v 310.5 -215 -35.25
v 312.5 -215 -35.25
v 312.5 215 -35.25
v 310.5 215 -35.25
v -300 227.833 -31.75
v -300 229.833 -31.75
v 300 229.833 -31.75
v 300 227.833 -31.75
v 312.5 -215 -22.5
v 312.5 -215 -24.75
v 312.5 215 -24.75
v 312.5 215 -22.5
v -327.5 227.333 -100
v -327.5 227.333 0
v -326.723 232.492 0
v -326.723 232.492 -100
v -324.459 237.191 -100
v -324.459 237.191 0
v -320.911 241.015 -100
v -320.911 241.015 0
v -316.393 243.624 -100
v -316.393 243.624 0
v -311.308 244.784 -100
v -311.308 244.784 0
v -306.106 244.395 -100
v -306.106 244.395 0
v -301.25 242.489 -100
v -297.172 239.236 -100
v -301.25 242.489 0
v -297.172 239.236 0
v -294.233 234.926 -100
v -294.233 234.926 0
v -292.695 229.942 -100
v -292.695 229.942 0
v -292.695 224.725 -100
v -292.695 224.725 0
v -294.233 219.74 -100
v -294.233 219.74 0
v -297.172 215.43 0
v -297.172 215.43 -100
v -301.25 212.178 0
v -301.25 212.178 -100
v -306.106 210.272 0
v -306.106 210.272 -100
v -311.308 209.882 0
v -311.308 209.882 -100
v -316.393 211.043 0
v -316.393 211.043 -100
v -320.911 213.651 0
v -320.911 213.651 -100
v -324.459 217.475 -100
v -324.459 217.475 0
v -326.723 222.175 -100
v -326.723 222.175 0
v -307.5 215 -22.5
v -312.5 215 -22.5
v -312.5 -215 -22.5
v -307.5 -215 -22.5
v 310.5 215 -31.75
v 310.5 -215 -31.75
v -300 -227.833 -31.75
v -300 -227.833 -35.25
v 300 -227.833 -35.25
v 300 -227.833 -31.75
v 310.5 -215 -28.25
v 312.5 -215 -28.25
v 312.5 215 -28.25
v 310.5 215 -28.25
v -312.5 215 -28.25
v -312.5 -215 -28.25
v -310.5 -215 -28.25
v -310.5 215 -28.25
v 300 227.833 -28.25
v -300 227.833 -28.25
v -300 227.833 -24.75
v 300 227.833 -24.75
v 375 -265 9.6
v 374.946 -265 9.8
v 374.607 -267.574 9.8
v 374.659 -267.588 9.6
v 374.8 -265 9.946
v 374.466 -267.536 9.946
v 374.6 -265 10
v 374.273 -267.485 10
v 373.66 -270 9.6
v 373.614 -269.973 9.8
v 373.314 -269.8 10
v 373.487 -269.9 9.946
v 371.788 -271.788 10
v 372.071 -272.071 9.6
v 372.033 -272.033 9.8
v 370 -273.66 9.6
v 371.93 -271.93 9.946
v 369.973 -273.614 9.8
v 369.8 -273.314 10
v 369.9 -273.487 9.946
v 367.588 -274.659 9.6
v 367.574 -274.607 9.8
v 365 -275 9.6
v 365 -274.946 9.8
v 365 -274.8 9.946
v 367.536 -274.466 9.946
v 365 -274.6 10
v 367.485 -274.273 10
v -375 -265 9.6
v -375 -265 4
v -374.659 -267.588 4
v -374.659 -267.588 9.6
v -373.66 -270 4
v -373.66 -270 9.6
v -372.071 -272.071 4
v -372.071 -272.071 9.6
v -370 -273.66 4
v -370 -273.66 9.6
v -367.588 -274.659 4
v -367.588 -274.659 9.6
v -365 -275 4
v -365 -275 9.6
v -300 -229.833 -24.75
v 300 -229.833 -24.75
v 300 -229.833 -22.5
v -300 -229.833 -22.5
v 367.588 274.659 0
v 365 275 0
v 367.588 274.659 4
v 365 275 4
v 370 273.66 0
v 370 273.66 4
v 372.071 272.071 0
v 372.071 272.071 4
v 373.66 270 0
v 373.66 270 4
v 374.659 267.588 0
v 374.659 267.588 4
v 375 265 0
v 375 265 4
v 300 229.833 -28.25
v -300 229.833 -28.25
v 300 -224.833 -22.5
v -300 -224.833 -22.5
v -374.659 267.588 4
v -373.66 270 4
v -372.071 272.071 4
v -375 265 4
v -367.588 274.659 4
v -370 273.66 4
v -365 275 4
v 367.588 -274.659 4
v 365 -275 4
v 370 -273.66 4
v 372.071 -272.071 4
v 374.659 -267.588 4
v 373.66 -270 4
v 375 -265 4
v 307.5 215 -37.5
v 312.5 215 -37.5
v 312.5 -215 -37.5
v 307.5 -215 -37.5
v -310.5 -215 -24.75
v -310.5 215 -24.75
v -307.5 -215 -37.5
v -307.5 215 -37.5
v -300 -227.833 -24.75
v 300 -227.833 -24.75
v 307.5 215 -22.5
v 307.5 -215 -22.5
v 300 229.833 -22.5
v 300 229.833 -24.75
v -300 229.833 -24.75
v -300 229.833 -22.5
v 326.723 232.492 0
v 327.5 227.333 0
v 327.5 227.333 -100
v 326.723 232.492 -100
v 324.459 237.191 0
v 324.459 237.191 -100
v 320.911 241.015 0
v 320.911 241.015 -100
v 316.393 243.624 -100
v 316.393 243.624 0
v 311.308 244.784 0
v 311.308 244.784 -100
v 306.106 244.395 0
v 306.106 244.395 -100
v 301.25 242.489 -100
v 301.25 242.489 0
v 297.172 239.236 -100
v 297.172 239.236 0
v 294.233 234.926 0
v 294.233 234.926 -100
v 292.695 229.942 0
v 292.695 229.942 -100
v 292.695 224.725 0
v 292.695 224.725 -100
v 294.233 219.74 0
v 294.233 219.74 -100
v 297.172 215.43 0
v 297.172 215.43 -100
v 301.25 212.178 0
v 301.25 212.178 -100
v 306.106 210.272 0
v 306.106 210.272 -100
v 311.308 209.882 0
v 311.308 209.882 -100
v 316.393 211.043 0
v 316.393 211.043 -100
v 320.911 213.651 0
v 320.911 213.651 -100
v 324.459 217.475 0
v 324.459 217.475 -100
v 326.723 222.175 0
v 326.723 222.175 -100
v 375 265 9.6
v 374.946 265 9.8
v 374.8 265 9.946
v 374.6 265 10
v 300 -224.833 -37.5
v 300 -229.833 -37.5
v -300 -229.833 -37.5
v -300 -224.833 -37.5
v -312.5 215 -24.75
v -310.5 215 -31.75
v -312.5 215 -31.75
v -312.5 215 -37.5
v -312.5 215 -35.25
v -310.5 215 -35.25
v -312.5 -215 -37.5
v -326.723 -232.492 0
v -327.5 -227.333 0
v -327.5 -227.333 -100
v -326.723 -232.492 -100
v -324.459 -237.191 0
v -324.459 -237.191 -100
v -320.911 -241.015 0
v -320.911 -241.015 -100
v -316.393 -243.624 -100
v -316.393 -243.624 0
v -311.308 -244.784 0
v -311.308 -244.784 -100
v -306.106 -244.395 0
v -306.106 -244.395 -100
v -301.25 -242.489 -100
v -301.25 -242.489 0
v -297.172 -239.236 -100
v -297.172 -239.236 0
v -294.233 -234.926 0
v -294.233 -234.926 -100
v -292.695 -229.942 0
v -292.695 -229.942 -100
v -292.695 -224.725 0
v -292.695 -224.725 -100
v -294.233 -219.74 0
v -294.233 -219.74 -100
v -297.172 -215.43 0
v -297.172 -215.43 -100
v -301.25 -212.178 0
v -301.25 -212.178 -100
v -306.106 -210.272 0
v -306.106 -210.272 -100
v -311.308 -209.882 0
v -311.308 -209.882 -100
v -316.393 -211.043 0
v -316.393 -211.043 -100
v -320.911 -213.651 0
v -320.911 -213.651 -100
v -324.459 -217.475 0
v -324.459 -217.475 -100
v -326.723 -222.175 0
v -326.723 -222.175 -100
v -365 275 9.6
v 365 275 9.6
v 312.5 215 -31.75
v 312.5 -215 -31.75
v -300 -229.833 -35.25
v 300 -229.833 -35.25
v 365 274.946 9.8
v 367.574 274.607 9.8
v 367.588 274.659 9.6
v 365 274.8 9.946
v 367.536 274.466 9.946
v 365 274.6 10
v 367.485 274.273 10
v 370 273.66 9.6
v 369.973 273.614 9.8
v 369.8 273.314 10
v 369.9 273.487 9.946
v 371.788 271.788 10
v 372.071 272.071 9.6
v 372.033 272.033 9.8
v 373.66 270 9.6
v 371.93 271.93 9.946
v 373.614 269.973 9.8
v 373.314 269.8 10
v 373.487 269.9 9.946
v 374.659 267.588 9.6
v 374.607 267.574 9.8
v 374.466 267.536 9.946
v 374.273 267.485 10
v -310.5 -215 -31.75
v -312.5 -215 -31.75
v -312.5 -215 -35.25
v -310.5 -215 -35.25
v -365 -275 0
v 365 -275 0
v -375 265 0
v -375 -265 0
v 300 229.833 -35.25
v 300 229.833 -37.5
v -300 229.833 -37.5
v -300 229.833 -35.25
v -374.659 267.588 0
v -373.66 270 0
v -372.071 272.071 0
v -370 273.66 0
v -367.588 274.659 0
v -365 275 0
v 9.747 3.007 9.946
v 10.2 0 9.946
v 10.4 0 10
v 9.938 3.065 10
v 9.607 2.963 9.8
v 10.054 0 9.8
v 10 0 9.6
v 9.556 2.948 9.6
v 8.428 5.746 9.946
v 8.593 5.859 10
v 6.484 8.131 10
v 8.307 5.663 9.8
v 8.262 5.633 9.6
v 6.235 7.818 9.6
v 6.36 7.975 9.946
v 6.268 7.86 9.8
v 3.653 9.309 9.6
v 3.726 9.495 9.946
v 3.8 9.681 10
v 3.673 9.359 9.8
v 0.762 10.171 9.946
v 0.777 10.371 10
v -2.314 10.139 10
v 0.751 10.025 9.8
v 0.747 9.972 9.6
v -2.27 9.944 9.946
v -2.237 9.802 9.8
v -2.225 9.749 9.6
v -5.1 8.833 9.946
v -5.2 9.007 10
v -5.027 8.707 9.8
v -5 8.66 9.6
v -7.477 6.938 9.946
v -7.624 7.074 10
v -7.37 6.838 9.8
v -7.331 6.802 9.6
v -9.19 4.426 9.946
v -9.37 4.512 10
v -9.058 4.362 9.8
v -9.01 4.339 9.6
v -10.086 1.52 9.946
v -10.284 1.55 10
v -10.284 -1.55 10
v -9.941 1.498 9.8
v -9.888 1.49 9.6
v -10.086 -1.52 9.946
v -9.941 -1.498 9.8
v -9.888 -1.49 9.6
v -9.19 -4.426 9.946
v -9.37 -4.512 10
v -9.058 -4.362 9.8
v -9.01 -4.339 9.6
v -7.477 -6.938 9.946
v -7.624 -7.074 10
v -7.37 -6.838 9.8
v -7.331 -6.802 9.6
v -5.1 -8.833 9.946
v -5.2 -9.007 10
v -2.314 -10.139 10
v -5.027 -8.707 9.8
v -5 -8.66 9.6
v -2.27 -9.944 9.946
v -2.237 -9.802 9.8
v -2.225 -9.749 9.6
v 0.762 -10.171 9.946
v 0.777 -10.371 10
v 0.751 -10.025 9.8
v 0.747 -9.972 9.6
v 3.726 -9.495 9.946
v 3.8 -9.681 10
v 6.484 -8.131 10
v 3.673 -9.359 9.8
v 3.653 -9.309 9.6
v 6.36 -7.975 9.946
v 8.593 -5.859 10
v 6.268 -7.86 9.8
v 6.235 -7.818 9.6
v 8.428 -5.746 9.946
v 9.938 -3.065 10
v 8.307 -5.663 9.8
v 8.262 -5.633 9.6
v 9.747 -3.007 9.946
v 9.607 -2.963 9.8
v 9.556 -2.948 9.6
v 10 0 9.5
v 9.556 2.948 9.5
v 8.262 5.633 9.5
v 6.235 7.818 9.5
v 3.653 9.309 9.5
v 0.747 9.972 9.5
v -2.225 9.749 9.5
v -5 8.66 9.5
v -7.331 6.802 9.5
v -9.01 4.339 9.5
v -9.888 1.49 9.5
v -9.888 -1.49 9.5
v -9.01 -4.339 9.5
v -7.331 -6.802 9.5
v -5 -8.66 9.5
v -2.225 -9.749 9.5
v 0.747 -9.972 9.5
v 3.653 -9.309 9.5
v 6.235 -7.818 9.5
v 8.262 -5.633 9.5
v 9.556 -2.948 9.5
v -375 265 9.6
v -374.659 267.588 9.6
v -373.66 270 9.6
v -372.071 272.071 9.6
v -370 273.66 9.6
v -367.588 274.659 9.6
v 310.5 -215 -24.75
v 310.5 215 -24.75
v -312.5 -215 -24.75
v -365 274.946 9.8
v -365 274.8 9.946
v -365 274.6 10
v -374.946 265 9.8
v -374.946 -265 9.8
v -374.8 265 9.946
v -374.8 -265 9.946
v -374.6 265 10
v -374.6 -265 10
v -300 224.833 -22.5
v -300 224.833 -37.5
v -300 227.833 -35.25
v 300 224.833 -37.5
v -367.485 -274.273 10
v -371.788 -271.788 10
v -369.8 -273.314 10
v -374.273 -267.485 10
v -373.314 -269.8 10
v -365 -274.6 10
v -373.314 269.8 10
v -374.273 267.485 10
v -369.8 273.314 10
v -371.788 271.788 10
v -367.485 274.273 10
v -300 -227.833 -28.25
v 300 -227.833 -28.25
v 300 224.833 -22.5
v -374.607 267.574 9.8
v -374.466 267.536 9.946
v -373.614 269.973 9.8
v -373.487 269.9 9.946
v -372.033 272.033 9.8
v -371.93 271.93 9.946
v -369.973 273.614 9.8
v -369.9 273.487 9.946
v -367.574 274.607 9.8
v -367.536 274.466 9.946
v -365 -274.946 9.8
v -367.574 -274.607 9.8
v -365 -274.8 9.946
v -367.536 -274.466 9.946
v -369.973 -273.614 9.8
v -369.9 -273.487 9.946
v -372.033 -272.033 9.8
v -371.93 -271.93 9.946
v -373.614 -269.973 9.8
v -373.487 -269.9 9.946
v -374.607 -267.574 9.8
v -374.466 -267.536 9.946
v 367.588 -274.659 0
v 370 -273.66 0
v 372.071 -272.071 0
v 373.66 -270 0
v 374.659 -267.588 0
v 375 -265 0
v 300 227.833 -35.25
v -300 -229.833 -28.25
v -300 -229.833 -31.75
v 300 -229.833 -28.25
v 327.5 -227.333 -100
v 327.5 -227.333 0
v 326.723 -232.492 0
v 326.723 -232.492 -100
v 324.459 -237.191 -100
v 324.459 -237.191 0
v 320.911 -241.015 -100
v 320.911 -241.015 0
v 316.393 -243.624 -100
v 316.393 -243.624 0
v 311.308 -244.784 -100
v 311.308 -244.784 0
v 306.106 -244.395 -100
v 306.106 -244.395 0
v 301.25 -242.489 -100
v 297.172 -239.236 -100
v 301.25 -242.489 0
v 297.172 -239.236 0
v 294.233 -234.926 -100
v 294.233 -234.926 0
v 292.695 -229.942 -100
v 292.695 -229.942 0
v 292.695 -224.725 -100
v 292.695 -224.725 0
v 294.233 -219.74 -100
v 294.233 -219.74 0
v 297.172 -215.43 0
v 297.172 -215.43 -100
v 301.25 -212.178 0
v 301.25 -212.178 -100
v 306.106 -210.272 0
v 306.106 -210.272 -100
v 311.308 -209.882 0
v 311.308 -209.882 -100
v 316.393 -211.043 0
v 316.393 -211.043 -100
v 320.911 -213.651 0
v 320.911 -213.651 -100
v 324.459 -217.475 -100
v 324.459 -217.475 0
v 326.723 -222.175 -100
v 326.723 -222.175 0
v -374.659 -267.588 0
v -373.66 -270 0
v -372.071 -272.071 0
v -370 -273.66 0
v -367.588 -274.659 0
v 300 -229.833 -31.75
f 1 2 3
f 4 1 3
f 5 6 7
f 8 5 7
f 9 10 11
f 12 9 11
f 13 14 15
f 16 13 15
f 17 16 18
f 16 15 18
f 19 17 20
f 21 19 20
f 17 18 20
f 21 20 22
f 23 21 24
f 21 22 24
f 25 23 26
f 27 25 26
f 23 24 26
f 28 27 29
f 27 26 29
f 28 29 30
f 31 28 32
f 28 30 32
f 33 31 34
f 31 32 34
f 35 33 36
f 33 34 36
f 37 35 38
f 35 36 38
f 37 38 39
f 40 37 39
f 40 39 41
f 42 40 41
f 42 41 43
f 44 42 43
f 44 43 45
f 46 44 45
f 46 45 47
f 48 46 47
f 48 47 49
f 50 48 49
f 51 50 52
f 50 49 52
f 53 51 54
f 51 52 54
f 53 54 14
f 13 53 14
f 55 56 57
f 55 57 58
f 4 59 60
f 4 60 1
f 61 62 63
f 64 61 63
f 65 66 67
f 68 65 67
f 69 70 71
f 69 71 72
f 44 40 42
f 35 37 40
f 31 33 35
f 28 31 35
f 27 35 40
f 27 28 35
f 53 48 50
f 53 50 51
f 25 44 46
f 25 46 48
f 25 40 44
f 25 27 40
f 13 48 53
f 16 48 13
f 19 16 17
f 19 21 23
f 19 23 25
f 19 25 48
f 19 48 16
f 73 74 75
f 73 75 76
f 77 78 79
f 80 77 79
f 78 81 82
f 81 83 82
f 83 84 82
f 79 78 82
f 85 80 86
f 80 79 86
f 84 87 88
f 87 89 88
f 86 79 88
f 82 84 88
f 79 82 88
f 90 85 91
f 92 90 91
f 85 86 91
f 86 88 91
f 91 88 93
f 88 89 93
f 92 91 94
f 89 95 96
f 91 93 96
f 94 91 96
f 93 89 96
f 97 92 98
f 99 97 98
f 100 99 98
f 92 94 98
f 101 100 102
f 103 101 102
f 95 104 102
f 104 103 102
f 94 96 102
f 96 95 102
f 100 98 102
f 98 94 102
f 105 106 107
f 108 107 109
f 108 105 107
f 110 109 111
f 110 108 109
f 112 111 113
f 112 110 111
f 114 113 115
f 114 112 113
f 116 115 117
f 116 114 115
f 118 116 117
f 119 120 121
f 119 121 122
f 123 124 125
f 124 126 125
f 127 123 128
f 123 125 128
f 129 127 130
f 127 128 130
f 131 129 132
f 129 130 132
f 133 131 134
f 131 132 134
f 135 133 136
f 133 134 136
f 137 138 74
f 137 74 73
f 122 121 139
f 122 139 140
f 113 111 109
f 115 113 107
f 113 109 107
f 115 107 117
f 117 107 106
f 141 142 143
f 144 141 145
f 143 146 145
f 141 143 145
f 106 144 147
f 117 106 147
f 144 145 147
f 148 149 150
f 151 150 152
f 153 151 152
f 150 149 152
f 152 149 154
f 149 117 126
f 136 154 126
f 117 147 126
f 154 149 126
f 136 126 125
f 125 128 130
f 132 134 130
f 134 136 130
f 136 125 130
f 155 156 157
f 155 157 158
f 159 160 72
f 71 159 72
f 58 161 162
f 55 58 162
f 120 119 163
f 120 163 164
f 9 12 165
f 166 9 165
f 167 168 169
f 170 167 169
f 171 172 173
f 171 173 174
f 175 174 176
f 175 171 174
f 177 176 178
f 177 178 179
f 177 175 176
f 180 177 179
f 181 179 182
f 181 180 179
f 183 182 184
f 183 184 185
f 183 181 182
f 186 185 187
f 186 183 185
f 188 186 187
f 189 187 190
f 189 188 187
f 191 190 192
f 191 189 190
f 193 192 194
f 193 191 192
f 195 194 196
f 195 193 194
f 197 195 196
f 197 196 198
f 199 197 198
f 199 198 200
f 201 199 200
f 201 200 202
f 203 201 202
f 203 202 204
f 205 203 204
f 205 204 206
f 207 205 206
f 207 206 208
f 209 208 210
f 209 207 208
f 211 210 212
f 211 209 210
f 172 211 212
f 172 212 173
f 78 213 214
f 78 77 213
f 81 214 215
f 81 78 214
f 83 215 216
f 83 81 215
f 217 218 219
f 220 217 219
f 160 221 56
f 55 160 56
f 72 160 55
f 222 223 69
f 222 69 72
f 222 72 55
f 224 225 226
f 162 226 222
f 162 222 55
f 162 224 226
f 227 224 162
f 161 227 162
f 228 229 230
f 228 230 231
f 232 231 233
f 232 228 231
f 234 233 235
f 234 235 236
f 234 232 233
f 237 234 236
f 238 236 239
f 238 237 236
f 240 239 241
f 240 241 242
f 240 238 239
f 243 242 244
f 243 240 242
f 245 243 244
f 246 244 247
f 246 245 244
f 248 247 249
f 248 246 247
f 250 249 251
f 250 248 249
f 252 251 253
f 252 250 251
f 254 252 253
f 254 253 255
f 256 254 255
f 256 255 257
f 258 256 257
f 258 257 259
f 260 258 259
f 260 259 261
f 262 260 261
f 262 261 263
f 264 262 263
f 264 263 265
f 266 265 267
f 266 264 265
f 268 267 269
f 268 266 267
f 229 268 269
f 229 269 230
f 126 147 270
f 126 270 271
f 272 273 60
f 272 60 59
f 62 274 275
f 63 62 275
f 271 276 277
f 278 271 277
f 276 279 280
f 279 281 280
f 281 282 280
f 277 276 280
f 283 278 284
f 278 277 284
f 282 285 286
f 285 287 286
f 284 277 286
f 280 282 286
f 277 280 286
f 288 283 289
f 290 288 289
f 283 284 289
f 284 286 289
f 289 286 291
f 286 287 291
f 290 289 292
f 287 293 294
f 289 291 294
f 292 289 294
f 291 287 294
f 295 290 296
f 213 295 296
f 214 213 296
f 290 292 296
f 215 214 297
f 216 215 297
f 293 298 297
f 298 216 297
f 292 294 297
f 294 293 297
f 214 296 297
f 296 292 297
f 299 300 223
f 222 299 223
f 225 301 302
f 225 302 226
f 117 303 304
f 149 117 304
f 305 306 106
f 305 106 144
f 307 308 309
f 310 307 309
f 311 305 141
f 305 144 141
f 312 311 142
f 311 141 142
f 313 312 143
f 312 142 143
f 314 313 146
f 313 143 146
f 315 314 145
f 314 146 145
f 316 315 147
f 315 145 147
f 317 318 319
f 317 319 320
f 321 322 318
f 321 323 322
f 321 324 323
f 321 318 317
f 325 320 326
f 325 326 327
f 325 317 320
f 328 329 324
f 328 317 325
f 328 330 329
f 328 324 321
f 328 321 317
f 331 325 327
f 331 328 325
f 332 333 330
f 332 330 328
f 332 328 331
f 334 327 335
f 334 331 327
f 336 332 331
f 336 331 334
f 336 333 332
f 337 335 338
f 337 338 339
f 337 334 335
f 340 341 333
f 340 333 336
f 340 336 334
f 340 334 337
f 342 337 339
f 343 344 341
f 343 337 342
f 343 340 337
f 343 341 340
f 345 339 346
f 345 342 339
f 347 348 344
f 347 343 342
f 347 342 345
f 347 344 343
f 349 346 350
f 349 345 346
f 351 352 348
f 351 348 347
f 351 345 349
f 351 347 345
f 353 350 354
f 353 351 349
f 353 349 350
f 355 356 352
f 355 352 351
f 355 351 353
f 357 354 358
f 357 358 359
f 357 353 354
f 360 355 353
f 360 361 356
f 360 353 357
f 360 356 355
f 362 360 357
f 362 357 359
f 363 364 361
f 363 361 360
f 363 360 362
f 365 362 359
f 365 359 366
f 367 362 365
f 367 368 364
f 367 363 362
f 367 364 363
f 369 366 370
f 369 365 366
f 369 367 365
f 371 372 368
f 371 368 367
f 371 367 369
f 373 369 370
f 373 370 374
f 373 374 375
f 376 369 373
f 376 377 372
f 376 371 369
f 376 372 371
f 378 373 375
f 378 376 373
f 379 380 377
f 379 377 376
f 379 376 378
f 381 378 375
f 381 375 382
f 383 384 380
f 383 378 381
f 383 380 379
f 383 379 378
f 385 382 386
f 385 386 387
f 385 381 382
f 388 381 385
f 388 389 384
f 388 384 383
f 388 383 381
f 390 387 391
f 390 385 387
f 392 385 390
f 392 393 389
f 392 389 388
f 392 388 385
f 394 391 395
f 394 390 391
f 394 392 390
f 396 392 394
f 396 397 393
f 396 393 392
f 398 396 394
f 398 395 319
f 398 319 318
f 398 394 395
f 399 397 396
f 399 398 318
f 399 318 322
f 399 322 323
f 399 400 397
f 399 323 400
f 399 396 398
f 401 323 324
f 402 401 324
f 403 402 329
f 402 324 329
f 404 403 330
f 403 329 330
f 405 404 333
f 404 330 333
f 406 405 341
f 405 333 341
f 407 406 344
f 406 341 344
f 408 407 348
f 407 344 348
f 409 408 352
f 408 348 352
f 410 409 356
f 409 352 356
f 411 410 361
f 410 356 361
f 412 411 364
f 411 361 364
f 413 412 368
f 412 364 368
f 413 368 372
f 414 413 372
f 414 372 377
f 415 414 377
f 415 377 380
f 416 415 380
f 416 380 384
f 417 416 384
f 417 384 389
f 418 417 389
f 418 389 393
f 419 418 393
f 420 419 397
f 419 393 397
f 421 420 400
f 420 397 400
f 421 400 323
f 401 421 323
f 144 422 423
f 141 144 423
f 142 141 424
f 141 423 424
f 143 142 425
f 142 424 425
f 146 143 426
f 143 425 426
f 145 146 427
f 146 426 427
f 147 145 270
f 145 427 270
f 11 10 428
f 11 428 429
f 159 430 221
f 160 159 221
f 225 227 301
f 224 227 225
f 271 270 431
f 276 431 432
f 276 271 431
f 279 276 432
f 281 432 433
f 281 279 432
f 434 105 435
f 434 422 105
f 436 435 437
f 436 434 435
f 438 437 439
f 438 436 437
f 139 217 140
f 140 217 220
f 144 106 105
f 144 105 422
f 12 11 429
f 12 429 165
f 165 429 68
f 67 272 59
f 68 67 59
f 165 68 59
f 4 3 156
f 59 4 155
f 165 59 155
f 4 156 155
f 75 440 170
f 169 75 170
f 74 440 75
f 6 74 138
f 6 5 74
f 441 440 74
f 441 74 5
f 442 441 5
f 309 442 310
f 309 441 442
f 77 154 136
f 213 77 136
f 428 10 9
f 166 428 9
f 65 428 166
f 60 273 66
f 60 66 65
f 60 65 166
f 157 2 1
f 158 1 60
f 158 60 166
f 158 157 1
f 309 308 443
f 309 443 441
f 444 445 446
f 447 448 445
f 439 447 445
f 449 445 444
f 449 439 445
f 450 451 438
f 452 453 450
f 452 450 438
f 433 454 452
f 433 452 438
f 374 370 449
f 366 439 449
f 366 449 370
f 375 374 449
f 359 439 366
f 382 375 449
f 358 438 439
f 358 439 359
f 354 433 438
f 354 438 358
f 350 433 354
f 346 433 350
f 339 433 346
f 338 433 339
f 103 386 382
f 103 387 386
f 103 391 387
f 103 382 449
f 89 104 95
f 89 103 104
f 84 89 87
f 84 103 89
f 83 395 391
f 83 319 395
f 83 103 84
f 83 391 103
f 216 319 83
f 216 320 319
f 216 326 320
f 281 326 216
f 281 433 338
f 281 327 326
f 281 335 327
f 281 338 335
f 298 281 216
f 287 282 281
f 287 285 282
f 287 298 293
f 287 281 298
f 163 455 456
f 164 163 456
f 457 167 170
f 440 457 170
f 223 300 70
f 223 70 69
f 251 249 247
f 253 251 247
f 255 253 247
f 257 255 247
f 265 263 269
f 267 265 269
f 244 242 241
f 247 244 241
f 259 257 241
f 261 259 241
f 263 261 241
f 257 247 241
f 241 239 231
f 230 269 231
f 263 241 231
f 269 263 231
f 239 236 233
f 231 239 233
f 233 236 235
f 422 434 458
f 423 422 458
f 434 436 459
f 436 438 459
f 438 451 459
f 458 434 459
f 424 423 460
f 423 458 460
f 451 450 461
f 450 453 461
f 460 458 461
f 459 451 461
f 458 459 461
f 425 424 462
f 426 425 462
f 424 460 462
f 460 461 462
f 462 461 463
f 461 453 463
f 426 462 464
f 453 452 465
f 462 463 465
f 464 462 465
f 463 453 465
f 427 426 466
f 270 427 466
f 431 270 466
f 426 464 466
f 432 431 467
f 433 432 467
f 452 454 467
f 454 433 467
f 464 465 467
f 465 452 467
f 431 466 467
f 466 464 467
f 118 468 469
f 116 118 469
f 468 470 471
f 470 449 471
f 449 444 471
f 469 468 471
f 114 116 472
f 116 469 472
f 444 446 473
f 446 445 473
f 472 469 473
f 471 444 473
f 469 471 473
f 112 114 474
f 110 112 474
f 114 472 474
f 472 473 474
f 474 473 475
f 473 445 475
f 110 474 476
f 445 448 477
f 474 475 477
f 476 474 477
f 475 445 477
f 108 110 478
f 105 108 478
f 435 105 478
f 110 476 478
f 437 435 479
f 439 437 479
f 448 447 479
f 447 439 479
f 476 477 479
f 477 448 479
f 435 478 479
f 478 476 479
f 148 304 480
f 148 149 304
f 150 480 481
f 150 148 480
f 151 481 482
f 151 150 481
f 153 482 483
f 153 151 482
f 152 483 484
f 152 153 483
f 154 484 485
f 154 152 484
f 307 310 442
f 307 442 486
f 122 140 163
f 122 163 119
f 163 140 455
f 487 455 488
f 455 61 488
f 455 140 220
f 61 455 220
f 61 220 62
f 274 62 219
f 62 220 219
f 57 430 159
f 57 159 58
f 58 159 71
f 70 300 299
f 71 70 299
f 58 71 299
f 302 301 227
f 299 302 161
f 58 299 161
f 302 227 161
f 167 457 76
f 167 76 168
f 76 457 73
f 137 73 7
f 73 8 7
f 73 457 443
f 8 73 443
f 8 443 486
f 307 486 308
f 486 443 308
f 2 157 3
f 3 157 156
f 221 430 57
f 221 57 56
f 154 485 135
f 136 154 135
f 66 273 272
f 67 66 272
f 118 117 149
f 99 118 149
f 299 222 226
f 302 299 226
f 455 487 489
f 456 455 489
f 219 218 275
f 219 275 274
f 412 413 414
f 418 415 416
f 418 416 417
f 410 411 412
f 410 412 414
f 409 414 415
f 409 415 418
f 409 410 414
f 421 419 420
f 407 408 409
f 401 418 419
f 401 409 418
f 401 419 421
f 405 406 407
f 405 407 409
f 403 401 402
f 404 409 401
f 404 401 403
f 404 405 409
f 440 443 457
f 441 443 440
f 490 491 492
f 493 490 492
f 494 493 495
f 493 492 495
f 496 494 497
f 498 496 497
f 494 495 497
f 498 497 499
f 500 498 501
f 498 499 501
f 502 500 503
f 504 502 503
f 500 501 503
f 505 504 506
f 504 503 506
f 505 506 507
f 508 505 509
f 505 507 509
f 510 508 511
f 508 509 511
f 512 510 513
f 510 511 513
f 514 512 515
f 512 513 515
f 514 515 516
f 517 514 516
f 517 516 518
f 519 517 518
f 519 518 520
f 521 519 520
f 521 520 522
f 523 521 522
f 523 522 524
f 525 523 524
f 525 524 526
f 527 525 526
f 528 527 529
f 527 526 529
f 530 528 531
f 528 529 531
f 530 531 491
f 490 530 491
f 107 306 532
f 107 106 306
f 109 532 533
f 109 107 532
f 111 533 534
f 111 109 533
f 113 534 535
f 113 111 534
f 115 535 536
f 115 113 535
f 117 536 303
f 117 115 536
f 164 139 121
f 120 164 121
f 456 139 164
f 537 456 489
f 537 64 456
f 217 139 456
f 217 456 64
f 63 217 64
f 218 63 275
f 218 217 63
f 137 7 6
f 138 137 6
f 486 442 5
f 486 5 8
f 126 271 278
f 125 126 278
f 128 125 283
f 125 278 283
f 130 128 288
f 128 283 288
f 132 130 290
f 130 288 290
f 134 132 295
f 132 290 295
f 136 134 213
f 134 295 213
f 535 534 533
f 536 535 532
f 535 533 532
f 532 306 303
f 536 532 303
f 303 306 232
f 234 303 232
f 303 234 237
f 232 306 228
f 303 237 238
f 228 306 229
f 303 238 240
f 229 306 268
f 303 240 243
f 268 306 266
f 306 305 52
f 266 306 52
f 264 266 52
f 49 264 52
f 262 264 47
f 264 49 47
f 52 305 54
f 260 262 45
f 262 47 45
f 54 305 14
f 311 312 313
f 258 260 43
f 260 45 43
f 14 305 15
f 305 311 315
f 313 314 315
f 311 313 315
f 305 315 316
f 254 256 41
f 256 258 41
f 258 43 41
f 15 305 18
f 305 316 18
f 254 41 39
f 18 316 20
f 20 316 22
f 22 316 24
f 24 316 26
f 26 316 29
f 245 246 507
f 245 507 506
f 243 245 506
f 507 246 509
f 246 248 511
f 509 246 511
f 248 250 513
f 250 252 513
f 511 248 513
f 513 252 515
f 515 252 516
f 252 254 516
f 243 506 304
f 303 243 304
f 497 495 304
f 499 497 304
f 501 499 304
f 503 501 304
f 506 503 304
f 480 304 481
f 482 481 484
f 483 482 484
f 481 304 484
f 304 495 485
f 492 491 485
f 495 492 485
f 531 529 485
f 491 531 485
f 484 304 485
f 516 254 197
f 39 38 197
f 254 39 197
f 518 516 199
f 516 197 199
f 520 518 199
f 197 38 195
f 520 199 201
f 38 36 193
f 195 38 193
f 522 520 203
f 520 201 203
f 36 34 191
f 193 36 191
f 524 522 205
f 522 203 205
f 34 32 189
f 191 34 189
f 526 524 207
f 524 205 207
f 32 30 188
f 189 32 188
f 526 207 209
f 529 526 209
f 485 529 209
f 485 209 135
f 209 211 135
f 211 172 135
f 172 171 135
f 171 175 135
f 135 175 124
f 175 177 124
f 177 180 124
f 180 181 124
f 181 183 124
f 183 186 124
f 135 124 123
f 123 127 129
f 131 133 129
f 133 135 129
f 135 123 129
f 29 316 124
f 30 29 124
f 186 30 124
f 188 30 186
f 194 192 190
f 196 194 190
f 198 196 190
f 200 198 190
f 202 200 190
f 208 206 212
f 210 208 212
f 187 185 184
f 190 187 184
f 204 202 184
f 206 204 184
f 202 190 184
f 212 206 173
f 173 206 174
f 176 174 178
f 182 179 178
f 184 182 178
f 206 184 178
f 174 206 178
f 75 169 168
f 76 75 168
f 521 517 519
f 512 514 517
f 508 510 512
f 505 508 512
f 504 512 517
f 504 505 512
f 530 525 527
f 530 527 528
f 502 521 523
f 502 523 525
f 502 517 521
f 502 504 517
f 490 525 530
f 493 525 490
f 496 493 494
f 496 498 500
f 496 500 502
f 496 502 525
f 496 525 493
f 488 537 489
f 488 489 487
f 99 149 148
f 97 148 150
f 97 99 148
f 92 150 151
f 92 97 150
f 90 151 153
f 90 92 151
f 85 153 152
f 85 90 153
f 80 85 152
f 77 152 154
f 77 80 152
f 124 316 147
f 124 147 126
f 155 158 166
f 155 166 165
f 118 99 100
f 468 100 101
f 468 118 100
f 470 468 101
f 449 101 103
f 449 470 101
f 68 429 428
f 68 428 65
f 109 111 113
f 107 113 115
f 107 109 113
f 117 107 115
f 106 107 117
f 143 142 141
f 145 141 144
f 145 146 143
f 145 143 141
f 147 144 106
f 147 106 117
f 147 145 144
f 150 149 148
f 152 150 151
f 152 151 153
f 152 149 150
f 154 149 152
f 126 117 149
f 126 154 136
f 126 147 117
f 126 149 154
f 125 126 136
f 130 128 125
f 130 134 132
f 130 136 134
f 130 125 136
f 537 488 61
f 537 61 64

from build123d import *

# Parameters (mm, degrees)
SKETCH1_W               = 750
SKETCH1_H               = 550
BOSS_EXTRUDE1_DEPTH     = 4
SKETCH2_R               = 17.5
BOSS_EXTRUDE2_DEPTH     = 100
MIRROR2_COPY_1_SKETCH_R = 17.5
MIRROR2_COPY_1_DEPTH    = 100
SKETCH3_W               = 600
SKETCH3_H               = 5
BOSS_EXTRUDE3_DEPTH     = 7.5
SKETCH3_W_2             = 5
SKETCH3_H_2             = 430
BOSS_EXTRUDE3_2_DEPTH   = 7.5
SKETCH4_W               = 3.5
SKETCH4_H               = 430
CUT_EXTRUDE1_DEPTH      = 2
SKETCH5_W               = 600
SKETCH5_H               = 3.5
CUT_EXTRUDE2_DEPTH      = 2
SKETCH7_W               = 750
SKETCH7_H               = 550
BOSS_EXTRUDE4_DEPTH     = 6
SKETCH8_R               = 10
CUT_EXTRUDE4_DEPTH      = 0.5
FILLET1_R               = 10
FILLET2_R               = 10
FILLET3_R               = 0.4


with BuildPart() as part:
    # Sketch1 → Boss-Extrude1 (new body)
    with BuildSketch(Plane.XY):
        Rectangle(SKETCH1_W, SKETCH1_H)
    extrude(amount=BOSS_EXTRUDE1_DEPTH)

    # Sketch2 → Boss-Extrude2 (add)
    with BuildSketch(Plane(origin=(0, 0, 0), x_dir=(-1, 0, 0), z_dir=(0, 0, -1))):
        with Locations((310, 227.333333333)):
            Circle(SKETCH2_R)
    boss_extrude2 = extrude(amount=BOSS_EXTRUDE2_DEPTH)

    # Mirror1: Boss-Extrude2 across plane
    add(boss_extrude2.mirror(Plane.ZX))

    # Mirror2: Boss-Extrude2 across plane
    add(boss_extrude2.mirror(Plane(origin=(0, 0, 0), x_dir=(0, 0, 1), z_dir=(1, 0, 0))))

    # Mirror2 copy 1 sketch → Mirror2 copy 1 (add)
    with BuildSketch(Plane(origin=(0, 0, 0), x_dir=(1, 0, 0), z_dir=(0, 0, -1))):
        with Locations((310, 227.333333333)):
            Circle(MIRROR2_COPY_1_SKETCH_R)
    extrude(amount=MIRROR2_COPY_1_DEPTH)

    # Fillet2
    fillet2_edges = [part.edges().sort_by_distance(p)[0] for p in [
        (-375, 275, 2),
        (375, 275, 2),
        (375, -275, 2),
        (-375, -275, 2),
    ]]
    fillet(fillet2_edges, radius=FILLET2_R)


with BuildPart() as body_2:
    # Sketch3 → Boss-Extrude3 (new, symmetric)
    with BuildSketch(Plane(origin=(0, 0, -30), x_dir=(-1, 0, 0), z_dir=(0, 0, -1))):
        with Locations((0, 227.333333333)):
            Rectangle(SKETCH3_W, SKETCH3_H)
    extrude(amount=BOSS_EXTRUDE3_DEPTH, both=True)

    # Sketch5 → Cut-Extrude2 (cut)
    with BuildSketch(Plane(origin=(0, 229.833333333, 0), x_dir=(1, 0, 0), z_dir=(0, 1, 0))):
        with Locations((0, 33.5)):
            Rectangle(SKETCH5_W, SKETCH5_H)
        with Locations((0, 26.5)):
            Rectangle(SKETCH5_W, SKETCH5_H)
    extrude(amount=-CUT_EXTRUDE2_DEPTH, mode=Mode.SUBTRACT)


with BuildPart() as body_3:
    # Sketch3 → Boss-Extrude3 2 (new, symmetric)
    with BuildSketch(Plane(origin=(0, 0, -30), x_dir=(-1, 0, 0), z_dir=(0, 0, -1))):
        with Locations((-310, 0)):
            Rectangle(SKETCH3_W_2, SKETCH3_H_2)
    extrude(amount=BOSS_EXTRUDE3_2_DEPTH, both=True)

    # Sketch4 → Cut-Extrude1 (cut)
    with BuildSketch(Plane(origin=(312.5, 0, 0), x_dir=(0, 0, -1), z_dir=(1, 0, 0))):
        with Locations((33.5, 0)):
            Rectangle(SKETCH4_W, SKETCH4_H)
        with Locations((26.5, 0)):
            Rectangle(SKETCH4_W, SKETCH4_H)
    extrude(amount=-CUT_EXTRUDE1_DEPTH, mode=Mode.SUBTRACT)


with BuildPart() as body_4:
    # Mirror4: mirrored copy
    add(body_2.part.mirror(Plane.ZX))


with BuildPart() as body_5:
    # Mirror5: mirrored copy
    add(body_3.part.mirror(Plane(origin=(0, 0, 0), x_dir=(0, 0, 1), z_dir=(1, 0, 0))))


with BuildPart() as body_6:
    # Sketch7 → Boss-Extrude4 (new body)
    with BuildSketch(Plane.XY.offset(4)):
        Rectangle(SKETCH7_W, SKETCH7_H)
    extrude(amount=BOSS_EXTRUDE4_DEPTH)

    # Sketch8 → Cut-Extrude4 (cut)
    with BuildSketch(Plane.XY.offset(10)):
        Circle(SKETCH8_R)
    extrude(amount=-CUT_EXTRUDE4_DEPTH, mode=Mode.SUBTRACT)

    # Fillet1
    fillet1_edges = [body_6.edges().sort_by_distance(p)[0] for p in [
        (375, 275, 7),
        (375, -275, 7),
        (-375, -275, 7),
        (-375, 275, 7),
    ]]
    fillet(fillet1_edges, radius=FILLET1_R)

    # Fillet3
    fillet3_edges = [body_6.edges().sort_by_distance(p)[0] for p in [
        (-10, 0, 10),
        (-375, 0, 10),
        (0, 275, 10),
        (0, -275, 10),
        (375, 0, 10),
        (372.071067812, 272.071067812, 10),
        (372.071067812, -272.071067812, 10),
        (-372.071067812, -272.071067812, 10),
        (-372.071067812, 272.071067812, 10),
    ]]
    fillet(fillet3_edges, radius=FILLET3_R)


solid = Compound([part.part, body_2.part, body_3.part, body_4.part, body_5.part, body_6.part])
